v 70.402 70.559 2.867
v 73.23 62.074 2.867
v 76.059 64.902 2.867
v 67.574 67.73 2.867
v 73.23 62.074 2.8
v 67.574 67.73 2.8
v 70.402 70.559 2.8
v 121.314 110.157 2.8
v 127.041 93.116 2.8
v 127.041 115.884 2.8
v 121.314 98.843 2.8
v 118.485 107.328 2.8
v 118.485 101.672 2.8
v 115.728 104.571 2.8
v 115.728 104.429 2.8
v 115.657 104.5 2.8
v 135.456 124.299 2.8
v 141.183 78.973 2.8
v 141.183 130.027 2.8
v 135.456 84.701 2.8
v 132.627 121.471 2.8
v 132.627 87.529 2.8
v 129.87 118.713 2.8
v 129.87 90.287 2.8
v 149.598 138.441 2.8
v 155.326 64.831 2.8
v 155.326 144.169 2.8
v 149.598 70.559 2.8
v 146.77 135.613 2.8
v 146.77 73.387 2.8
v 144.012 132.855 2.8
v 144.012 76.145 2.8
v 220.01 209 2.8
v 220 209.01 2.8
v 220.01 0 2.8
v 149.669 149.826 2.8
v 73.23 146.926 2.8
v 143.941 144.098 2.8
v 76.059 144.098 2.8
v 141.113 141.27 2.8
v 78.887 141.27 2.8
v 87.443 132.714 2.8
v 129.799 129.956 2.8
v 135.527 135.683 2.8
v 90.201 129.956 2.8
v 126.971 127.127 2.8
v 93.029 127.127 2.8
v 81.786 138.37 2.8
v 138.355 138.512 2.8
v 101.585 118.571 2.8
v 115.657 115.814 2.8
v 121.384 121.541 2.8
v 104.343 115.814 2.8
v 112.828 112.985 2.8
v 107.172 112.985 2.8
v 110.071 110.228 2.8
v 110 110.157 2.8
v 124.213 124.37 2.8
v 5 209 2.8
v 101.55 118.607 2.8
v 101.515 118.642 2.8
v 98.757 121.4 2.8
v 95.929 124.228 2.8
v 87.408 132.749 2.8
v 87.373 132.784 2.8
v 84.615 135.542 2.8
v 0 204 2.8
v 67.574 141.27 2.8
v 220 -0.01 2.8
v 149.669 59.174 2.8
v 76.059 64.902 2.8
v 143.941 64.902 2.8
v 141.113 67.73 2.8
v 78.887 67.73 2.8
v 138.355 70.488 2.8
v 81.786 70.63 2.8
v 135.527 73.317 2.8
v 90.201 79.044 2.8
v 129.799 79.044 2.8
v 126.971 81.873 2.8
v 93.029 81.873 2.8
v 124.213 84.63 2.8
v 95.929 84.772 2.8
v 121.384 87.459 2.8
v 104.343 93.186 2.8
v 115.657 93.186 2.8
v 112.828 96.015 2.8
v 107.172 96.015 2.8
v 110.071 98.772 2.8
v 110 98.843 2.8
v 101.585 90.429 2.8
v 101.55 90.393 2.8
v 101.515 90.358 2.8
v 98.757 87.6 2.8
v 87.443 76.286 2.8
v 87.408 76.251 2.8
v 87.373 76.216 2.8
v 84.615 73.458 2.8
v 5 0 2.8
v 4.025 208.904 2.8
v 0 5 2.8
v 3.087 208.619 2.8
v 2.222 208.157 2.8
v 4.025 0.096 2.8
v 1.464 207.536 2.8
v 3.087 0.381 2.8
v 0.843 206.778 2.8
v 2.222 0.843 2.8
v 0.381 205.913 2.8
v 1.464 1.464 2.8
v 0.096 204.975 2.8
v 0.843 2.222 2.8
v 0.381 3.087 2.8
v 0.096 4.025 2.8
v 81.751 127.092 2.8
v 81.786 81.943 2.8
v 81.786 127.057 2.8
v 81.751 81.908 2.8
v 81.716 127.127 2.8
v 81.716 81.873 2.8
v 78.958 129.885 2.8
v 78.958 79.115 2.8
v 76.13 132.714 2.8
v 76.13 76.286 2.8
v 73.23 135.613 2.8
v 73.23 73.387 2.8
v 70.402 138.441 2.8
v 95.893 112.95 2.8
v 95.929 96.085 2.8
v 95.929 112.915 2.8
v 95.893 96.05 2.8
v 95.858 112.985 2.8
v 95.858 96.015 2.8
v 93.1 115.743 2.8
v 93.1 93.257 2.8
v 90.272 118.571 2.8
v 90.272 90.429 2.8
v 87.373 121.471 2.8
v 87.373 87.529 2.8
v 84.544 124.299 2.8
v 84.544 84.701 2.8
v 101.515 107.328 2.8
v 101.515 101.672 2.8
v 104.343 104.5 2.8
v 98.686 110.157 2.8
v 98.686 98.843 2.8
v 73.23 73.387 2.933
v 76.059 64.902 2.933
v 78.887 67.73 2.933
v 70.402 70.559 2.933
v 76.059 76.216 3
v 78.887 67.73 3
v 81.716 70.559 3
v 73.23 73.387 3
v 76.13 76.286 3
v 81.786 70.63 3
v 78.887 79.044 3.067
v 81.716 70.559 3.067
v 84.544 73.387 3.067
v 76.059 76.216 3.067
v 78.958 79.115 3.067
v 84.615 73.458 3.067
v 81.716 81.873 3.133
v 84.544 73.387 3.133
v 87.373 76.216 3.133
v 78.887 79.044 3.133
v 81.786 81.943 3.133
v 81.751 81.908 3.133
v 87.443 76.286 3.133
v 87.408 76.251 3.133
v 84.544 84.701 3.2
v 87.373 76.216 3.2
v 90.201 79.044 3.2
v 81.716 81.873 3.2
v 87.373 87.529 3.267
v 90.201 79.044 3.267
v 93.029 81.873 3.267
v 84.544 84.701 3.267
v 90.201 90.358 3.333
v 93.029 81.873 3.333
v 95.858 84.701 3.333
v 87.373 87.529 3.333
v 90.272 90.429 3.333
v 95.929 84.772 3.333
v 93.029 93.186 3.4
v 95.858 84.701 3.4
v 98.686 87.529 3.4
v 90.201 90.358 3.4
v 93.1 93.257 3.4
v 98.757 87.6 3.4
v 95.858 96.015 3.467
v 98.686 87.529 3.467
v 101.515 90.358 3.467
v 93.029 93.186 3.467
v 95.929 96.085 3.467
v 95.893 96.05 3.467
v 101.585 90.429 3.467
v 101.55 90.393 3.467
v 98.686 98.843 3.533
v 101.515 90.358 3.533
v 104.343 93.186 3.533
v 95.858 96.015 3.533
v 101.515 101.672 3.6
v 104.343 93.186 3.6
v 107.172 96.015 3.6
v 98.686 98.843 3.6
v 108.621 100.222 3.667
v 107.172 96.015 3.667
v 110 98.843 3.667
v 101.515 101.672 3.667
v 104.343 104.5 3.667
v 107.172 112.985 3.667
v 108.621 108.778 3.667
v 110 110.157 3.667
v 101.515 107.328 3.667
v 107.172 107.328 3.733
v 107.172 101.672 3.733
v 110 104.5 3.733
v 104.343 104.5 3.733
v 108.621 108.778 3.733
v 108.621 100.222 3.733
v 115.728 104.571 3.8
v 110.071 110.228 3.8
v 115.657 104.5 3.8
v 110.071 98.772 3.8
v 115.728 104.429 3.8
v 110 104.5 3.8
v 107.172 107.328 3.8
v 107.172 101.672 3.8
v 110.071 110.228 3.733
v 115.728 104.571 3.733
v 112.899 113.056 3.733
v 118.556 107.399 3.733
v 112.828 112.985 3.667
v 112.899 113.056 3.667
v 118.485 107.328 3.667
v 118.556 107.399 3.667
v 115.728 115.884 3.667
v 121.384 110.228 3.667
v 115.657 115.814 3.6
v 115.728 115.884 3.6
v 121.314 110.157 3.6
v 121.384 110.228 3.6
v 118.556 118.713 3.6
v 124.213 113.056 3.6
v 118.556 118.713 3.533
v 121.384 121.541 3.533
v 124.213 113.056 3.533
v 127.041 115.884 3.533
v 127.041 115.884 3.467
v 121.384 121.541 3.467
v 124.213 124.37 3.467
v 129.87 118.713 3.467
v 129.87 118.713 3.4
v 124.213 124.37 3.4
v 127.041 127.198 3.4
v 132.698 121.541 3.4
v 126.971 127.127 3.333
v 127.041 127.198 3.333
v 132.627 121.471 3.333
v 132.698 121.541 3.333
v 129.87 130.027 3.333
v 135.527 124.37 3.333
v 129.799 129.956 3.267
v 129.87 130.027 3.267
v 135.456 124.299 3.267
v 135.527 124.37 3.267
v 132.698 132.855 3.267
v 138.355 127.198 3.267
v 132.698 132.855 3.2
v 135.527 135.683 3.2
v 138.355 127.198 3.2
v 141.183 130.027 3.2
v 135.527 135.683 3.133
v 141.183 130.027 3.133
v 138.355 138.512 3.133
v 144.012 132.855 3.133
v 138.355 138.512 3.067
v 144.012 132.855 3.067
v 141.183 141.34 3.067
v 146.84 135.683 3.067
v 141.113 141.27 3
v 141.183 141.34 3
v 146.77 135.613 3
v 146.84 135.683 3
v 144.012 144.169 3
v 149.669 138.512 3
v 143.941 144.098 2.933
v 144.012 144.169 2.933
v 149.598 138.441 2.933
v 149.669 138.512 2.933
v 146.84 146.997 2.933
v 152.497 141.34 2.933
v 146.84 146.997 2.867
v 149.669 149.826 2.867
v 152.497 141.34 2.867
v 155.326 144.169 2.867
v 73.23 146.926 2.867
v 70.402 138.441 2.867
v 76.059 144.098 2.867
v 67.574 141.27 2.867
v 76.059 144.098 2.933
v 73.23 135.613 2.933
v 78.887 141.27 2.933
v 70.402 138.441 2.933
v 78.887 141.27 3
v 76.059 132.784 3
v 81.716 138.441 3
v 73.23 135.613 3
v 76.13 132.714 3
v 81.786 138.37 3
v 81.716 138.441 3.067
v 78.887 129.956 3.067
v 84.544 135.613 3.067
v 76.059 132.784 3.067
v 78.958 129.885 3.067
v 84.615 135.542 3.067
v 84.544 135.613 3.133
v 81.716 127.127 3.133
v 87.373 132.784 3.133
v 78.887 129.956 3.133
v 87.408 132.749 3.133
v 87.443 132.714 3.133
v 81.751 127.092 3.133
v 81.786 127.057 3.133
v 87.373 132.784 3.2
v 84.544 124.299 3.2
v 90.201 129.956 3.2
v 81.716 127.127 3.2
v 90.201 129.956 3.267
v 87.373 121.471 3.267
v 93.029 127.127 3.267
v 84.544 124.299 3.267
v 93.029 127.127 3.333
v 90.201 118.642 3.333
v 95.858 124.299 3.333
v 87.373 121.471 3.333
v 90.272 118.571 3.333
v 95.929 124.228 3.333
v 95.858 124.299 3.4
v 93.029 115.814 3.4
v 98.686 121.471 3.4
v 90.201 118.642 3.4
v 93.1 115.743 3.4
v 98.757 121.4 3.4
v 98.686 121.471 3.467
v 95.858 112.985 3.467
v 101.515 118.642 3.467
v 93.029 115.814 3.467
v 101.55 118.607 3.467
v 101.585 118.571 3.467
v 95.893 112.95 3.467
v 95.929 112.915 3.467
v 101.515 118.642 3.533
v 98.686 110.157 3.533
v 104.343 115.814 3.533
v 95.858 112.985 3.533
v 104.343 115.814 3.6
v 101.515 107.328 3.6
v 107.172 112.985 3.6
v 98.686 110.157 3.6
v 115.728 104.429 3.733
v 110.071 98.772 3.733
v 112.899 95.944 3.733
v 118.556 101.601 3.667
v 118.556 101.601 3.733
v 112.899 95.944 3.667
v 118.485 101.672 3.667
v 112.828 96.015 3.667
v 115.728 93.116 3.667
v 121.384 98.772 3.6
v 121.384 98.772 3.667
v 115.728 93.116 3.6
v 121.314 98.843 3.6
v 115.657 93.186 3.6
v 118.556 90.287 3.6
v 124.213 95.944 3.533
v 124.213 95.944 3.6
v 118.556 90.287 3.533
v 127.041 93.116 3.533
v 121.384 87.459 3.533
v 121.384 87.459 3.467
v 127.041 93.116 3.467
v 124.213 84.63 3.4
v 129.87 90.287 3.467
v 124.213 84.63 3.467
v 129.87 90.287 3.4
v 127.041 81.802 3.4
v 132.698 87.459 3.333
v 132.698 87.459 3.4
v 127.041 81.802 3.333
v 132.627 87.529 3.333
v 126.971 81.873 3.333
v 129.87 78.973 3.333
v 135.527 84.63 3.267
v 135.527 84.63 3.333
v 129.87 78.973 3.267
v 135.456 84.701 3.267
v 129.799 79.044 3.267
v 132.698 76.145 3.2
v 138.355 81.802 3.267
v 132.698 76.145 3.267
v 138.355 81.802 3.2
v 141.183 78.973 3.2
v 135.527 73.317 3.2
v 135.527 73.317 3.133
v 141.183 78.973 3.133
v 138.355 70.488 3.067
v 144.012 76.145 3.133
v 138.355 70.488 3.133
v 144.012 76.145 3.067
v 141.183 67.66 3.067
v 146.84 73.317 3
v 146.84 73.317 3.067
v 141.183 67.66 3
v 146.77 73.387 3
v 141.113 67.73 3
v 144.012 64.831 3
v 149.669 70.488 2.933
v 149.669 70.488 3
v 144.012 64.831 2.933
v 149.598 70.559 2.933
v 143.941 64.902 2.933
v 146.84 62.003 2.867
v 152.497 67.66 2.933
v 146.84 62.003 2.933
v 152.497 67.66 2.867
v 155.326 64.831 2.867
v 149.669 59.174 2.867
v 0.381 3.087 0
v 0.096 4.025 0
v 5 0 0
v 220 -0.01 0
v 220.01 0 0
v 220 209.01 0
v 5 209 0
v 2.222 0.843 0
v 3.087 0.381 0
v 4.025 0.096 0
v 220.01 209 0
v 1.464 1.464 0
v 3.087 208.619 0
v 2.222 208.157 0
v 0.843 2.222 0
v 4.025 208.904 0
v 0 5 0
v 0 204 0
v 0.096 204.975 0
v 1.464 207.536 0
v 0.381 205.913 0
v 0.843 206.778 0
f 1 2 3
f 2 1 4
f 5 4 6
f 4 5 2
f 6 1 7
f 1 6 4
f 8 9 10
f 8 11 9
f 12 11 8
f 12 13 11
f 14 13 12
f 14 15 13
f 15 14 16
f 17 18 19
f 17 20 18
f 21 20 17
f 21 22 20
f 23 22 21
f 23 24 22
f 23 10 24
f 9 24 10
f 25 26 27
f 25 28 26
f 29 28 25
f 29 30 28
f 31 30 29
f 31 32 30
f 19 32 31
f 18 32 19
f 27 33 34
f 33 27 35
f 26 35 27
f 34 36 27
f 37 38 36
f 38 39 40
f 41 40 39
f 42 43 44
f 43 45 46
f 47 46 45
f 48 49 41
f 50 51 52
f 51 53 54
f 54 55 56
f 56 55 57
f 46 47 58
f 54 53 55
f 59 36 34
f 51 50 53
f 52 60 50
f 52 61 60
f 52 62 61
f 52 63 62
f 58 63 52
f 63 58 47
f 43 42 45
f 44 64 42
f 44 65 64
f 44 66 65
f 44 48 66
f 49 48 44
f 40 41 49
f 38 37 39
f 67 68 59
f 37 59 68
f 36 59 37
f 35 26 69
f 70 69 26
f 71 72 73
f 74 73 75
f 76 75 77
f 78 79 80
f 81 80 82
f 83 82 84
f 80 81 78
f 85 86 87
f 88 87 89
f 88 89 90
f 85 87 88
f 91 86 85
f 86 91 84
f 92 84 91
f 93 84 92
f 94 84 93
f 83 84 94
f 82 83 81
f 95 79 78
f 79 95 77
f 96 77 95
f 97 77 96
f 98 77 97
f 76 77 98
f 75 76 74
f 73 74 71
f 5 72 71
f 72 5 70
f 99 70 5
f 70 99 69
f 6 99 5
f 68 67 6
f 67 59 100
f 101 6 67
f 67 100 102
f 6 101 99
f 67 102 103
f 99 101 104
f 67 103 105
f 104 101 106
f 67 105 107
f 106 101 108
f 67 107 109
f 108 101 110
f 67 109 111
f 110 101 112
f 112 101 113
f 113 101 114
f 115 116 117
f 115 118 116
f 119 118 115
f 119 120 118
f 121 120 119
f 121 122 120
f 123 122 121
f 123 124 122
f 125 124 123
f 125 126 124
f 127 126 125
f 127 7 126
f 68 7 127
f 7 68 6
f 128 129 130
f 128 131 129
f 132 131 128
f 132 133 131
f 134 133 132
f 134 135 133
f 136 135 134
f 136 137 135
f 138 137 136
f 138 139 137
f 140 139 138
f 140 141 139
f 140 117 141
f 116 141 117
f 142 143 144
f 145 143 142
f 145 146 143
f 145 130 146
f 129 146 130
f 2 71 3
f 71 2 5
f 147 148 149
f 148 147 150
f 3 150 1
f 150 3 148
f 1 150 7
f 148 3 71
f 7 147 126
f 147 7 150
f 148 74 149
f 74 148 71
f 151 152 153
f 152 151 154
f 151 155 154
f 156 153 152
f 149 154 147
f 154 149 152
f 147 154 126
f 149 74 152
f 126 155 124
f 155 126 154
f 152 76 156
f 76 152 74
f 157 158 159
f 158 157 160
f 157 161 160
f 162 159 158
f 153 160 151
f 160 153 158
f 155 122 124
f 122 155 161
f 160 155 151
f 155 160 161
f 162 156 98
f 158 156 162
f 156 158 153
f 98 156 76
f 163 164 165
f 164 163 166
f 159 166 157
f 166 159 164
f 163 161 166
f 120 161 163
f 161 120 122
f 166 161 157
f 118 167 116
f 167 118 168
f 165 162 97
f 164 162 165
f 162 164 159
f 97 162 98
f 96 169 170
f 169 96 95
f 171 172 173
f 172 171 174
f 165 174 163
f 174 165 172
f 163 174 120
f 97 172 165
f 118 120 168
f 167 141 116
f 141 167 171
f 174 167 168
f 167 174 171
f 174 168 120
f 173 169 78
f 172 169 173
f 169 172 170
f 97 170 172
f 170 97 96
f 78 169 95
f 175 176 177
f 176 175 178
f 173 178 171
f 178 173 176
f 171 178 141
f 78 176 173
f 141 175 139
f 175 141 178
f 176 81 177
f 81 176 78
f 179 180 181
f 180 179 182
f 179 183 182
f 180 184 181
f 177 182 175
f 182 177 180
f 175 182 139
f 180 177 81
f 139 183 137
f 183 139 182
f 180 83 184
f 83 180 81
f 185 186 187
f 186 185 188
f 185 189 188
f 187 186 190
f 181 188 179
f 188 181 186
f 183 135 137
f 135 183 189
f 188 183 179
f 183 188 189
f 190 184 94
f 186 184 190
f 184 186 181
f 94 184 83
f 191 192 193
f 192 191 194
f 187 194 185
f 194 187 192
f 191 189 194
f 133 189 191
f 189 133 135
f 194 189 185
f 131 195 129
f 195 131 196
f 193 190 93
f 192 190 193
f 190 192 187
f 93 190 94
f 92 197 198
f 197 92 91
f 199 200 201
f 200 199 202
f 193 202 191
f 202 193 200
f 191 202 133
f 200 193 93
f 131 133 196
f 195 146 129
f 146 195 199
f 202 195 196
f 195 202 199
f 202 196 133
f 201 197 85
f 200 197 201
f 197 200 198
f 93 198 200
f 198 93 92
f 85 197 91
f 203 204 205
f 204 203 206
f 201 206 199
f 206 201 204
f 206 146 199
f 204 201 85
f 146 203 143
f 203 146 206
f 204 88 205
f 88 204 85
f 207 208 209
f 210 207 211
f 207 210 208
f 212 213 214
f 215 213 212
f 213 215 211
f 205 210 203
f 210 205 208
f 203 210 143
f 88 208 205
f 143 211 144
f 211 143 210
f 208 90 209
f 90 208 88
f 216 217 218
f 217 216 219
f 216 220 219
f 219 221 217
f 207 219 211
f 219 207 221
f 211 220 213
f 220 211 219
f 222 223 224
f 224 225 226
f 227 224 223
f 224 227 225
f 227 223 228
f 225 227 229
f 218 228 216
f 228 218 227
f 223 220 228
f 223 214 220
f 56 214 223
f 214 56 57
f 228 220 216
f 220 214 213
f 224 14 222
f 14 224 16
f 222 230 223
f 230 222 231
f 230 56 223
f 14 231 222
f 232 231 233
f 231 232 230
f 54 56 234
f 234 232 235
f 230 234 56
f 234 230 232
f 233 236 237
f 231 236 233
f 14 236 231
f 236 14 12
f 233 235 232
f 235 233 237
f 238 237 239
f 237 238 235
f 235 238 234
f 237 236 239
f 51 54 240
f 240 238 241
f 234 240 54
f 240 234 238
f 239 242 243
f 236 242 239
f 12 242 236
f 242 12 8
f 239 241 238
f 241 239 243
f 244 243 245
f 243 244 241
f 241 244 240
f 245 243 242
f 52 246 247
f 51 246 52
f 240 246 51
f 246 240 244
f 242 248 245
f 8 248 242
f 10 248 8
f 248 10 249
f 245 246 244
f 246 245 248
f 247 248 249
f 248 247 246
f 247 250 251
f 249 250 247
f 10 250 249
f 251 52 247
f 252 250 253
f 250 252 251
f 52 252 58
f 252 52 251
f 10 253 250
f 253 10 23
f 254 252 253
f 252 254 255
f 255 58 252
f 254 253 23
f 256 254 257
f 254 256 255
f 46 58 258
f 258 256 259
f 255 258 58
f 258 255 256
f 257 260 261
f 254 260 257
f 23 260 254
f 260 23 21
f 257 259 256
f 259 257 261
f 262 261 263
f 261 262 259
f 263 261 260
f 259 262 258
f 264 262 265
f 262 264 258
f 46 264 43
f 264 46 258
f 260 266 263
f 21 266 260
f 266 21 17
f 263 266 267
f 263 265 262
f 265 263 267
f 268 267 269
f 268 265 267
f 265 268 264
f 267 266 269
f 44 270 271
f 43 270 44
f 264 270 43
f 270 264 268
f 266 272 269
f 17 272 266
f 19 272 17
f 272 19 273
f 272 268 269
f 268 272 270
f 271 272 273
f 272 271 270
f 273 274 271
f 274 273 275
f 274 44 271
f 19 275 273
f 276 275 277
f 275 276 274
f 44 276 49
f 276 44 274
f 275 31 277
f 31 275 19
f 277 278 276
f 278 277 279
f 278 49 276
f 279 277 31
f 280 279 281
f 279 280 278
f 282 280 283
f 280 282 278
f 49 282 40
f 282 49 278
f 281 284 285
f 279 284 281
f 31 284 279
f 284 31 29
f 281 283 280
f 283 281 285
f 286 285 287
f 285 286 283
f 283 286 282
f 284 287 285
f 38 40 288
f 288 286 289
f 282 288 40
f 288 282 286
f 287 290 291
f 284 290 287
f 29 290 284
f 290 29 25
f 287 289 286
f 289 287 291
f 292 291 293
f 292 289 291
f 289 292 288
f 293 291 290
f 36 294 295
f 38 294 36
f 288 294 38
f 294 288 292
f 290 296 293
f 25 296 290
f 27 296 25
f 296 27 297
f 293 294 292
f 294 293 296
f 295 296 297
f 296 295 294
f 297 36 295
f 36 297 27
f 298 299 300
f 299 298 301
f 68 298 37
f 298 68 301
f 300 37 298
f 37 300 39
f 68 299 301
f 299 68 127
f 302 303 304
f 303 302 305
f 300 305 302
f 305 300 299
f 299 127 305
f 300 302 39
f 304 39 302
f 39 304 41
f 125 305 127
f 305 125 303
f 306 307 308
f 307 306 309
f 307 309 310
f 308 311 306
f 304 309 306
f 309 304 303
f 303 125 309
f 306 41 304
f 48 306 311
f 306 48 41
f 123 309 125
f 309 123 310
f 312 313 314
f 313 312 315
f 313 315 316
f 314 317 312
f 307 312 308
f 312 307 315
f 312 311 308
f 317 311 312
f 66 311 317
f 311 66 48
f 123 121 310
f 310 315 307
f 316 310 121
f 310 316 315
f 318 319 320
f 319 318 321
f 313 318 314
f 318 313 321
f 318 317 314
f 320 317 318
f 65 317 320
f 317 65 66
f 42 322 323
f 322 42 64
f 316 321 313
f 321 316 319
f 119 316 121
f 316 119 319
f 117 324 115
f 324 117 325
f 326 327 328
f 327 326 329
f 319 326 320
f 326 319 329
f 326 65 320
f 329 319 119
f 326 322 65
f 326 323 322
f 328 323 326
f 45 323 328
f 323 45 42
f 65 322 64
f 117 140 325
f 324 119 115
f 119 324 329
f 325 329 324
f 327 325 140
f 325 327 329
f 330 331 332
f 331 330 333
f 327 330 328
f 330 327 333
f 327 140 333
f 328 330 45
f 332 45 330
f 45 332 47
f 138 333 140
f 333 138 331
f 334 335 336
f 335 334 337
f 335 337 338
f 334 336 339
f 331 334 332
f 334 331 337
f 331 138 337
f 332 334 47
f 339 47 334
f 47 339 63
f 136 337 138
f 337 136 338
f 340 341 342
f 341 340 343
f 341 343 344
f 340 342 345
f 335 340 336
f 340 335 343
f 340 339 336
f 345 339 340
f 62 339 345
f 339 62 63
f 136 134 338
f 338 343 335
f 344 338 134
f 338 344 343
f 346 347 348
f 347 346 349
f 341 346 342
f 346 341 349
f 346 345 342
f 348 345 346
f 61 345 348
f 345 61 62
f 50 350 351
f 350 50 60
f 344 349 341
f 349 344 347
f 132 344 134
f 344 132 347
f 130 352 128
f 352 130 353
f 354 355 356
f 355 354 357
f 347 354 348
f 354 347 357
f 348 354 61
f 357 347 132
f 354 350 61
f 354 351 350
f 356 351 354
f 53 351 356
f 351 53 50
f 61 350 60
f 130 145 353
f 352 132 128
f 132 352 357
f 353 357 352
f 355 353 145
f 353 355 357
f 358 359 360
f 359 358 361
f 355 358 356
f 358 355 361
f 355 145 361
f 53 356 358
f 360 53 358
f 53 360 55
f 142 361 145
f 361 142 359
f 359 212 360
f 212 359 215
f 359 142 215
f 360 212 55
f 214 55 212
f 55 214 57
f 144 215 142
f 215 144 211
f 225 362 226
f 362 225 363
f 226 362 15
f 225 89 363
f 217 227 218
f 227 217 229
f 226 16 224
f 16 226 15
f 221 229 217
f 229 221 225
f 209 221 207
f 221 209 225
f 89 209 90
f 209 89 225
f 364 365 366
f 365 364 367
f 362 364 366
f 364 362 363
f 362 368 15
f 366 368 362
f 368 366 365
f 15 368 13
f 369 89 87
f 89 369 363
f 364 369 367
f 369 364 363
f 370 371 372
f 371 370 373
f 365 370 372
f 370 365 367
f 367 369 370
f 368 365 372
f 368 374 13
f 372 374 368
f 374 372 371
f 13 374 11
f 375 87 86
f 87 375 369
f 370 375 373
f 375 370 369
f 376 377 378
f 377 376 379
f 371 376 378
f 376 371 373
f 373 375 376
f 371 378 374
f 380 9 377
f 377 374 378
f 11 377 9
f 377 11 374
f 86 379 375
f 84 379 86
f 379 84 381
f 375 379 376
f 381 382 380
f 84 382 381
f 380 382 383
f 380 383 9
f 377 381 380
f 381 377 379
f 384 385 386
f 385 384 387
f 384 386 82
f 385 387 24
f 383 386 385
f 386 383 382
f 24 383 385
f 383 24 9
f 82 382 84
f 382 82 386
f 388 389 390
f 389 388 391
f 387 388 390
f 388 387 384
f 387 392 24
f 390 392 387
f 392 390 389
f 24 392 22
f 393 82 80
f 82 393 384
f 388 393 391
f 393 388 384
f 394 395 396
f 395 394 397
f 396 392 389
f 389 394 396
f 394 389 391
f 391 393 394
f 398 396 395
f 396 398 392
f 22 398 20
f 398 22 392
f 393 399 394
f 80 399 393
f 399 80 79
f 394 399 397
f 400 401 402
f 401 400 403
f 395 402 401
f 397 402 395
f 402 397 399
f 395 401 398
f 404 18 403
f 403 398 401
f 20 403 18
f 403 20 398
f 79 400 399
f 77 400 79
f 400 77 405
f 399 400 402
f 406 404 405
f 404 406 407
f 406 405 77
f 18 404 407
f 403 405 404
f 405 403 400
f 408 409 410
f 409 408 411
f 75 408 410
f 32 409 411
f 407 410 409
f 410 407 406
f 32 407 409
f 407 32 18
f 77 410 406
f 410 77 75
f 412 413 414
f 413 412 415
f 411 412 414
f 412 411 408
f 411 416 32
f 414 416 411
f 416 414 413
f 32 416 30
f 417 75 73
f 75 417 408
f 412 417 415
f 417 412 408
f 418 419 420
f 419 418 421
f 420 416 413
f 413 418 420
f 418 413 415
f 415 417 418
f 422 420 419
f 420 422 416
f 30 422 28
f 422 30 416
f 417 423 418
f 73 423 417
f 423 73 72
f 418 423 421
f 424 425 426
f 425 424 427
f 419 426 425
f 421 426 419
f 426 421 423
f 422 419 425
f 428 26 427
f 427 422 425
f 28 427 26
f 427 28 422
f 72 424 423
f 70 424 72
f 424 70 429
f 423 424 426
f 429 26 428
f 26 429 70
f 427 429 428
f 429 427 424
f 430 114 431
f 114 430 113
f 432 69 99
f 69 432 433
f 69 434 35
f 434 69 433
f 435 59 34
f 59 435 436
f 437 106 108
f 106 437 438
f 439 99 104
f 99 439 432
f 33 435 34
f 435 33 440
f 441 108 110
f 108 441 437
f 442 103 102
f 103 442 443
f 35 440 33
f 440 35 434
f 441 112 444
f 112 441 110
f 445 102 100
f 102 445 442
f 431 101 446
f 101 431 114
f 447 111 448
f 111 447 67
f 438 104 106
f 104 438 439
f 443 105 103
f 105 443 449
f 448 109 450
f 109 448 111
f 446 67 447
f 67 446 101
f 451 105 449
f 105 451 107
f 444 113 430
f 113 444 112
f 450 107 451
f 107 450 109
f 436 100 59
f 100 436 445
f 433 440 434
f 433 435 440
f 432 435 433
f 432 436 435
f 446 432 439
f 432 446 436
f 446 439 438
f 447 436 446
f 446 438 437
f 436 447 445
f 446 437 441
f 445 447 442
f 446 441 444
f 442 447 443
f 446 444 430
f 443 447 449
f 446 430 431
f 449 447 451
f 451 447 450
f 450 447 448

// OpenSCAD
// 滑槽拼接 - 方向2：前后方向
// A部分：220mm × 209mm × 2.8mm
// 滑槽从前向后

// 参数
width = 220;     // 宽度 (mm)
height = 209;    // 高度 (mm)
thickness = 2.8; // 厚度 (mm)
corner_radius = 5;  // 倒角半径 (mm)

// 滑槽参数
slot_depth = 3;       // 槽深度 (mm)
slot_height = 3;      // 槽高度 (mm)
slot_length = 200;    // 槽长度 (mm)
slot_offset = 10;      // 槽距离边缘 (mm)

// X 图案参数
x_max_height = 1.0;
x_width = 8;
x_diagonal = 120;

// 圆角矩形模块（右侧不倒角）
module rounded_rect_right_flat(w, h, r, t) {
    hull() {
        translate([r, r, 0]) cylinder(h = t, r = r, $fn = 32);
        translate([r, h - r, 0]) cylinder(h = t, r = r, $fn = 32);
        translate([w, h, 0]) cylinder(h = t, r = 0.01, $fn = 4);
        translate([w, 0, 0]) cylinder(h = t, r = 0.01, $fn = 4);
    }
}

// 创建主体
difference() {
    union() {
        // 面板主体
        color("LightGray") {
            rounded_rect_right_flat(width, height, corner_radius, thickness);
        }

        // X 图案
        color("DarkGray") {
            translate([width/2, height/2, 0])
            x_pattern();
        }
    }

    // 滑槽（在右侧，前后方向，从前向后）
    color("Blue") {
        translate([width - slot_depth, -0.1, slot_offset])
        cube([slot_depth + 0.2, 3, slot_length + 0.2]);
    }
}

// X 图案模块
module x_pattern() {
    segments = 30;
    segment_length = x_diagonal / segments;

    union() {
        for (i = [-segments/2:segments/2-1]) {
            dist_ratio = abs(i) / (segments/2);
            current_height = x_max_height * (1 - dist_ratio);

            translate([0, 0, thickness])
            rotate([0, 0, 45])
            translate([i * segment_length, -x_width/2, 0])
            cube([segment_length + 0.1, x_width, current_height]);
        }

        for (i = [-segments/2:segments/2-1]) {
            dist_ratio = abs(i) / (segments/2);
            current_height = x_max_height * (1 - dist_ratio);

            translate([0, 0, thickness])
            rotate([0, 0, -45])
            translate([i * segment_length, -x_width/2, 0])
            cube([segment_length + 0.1, x_width, current_height]);
        }
    }
}
